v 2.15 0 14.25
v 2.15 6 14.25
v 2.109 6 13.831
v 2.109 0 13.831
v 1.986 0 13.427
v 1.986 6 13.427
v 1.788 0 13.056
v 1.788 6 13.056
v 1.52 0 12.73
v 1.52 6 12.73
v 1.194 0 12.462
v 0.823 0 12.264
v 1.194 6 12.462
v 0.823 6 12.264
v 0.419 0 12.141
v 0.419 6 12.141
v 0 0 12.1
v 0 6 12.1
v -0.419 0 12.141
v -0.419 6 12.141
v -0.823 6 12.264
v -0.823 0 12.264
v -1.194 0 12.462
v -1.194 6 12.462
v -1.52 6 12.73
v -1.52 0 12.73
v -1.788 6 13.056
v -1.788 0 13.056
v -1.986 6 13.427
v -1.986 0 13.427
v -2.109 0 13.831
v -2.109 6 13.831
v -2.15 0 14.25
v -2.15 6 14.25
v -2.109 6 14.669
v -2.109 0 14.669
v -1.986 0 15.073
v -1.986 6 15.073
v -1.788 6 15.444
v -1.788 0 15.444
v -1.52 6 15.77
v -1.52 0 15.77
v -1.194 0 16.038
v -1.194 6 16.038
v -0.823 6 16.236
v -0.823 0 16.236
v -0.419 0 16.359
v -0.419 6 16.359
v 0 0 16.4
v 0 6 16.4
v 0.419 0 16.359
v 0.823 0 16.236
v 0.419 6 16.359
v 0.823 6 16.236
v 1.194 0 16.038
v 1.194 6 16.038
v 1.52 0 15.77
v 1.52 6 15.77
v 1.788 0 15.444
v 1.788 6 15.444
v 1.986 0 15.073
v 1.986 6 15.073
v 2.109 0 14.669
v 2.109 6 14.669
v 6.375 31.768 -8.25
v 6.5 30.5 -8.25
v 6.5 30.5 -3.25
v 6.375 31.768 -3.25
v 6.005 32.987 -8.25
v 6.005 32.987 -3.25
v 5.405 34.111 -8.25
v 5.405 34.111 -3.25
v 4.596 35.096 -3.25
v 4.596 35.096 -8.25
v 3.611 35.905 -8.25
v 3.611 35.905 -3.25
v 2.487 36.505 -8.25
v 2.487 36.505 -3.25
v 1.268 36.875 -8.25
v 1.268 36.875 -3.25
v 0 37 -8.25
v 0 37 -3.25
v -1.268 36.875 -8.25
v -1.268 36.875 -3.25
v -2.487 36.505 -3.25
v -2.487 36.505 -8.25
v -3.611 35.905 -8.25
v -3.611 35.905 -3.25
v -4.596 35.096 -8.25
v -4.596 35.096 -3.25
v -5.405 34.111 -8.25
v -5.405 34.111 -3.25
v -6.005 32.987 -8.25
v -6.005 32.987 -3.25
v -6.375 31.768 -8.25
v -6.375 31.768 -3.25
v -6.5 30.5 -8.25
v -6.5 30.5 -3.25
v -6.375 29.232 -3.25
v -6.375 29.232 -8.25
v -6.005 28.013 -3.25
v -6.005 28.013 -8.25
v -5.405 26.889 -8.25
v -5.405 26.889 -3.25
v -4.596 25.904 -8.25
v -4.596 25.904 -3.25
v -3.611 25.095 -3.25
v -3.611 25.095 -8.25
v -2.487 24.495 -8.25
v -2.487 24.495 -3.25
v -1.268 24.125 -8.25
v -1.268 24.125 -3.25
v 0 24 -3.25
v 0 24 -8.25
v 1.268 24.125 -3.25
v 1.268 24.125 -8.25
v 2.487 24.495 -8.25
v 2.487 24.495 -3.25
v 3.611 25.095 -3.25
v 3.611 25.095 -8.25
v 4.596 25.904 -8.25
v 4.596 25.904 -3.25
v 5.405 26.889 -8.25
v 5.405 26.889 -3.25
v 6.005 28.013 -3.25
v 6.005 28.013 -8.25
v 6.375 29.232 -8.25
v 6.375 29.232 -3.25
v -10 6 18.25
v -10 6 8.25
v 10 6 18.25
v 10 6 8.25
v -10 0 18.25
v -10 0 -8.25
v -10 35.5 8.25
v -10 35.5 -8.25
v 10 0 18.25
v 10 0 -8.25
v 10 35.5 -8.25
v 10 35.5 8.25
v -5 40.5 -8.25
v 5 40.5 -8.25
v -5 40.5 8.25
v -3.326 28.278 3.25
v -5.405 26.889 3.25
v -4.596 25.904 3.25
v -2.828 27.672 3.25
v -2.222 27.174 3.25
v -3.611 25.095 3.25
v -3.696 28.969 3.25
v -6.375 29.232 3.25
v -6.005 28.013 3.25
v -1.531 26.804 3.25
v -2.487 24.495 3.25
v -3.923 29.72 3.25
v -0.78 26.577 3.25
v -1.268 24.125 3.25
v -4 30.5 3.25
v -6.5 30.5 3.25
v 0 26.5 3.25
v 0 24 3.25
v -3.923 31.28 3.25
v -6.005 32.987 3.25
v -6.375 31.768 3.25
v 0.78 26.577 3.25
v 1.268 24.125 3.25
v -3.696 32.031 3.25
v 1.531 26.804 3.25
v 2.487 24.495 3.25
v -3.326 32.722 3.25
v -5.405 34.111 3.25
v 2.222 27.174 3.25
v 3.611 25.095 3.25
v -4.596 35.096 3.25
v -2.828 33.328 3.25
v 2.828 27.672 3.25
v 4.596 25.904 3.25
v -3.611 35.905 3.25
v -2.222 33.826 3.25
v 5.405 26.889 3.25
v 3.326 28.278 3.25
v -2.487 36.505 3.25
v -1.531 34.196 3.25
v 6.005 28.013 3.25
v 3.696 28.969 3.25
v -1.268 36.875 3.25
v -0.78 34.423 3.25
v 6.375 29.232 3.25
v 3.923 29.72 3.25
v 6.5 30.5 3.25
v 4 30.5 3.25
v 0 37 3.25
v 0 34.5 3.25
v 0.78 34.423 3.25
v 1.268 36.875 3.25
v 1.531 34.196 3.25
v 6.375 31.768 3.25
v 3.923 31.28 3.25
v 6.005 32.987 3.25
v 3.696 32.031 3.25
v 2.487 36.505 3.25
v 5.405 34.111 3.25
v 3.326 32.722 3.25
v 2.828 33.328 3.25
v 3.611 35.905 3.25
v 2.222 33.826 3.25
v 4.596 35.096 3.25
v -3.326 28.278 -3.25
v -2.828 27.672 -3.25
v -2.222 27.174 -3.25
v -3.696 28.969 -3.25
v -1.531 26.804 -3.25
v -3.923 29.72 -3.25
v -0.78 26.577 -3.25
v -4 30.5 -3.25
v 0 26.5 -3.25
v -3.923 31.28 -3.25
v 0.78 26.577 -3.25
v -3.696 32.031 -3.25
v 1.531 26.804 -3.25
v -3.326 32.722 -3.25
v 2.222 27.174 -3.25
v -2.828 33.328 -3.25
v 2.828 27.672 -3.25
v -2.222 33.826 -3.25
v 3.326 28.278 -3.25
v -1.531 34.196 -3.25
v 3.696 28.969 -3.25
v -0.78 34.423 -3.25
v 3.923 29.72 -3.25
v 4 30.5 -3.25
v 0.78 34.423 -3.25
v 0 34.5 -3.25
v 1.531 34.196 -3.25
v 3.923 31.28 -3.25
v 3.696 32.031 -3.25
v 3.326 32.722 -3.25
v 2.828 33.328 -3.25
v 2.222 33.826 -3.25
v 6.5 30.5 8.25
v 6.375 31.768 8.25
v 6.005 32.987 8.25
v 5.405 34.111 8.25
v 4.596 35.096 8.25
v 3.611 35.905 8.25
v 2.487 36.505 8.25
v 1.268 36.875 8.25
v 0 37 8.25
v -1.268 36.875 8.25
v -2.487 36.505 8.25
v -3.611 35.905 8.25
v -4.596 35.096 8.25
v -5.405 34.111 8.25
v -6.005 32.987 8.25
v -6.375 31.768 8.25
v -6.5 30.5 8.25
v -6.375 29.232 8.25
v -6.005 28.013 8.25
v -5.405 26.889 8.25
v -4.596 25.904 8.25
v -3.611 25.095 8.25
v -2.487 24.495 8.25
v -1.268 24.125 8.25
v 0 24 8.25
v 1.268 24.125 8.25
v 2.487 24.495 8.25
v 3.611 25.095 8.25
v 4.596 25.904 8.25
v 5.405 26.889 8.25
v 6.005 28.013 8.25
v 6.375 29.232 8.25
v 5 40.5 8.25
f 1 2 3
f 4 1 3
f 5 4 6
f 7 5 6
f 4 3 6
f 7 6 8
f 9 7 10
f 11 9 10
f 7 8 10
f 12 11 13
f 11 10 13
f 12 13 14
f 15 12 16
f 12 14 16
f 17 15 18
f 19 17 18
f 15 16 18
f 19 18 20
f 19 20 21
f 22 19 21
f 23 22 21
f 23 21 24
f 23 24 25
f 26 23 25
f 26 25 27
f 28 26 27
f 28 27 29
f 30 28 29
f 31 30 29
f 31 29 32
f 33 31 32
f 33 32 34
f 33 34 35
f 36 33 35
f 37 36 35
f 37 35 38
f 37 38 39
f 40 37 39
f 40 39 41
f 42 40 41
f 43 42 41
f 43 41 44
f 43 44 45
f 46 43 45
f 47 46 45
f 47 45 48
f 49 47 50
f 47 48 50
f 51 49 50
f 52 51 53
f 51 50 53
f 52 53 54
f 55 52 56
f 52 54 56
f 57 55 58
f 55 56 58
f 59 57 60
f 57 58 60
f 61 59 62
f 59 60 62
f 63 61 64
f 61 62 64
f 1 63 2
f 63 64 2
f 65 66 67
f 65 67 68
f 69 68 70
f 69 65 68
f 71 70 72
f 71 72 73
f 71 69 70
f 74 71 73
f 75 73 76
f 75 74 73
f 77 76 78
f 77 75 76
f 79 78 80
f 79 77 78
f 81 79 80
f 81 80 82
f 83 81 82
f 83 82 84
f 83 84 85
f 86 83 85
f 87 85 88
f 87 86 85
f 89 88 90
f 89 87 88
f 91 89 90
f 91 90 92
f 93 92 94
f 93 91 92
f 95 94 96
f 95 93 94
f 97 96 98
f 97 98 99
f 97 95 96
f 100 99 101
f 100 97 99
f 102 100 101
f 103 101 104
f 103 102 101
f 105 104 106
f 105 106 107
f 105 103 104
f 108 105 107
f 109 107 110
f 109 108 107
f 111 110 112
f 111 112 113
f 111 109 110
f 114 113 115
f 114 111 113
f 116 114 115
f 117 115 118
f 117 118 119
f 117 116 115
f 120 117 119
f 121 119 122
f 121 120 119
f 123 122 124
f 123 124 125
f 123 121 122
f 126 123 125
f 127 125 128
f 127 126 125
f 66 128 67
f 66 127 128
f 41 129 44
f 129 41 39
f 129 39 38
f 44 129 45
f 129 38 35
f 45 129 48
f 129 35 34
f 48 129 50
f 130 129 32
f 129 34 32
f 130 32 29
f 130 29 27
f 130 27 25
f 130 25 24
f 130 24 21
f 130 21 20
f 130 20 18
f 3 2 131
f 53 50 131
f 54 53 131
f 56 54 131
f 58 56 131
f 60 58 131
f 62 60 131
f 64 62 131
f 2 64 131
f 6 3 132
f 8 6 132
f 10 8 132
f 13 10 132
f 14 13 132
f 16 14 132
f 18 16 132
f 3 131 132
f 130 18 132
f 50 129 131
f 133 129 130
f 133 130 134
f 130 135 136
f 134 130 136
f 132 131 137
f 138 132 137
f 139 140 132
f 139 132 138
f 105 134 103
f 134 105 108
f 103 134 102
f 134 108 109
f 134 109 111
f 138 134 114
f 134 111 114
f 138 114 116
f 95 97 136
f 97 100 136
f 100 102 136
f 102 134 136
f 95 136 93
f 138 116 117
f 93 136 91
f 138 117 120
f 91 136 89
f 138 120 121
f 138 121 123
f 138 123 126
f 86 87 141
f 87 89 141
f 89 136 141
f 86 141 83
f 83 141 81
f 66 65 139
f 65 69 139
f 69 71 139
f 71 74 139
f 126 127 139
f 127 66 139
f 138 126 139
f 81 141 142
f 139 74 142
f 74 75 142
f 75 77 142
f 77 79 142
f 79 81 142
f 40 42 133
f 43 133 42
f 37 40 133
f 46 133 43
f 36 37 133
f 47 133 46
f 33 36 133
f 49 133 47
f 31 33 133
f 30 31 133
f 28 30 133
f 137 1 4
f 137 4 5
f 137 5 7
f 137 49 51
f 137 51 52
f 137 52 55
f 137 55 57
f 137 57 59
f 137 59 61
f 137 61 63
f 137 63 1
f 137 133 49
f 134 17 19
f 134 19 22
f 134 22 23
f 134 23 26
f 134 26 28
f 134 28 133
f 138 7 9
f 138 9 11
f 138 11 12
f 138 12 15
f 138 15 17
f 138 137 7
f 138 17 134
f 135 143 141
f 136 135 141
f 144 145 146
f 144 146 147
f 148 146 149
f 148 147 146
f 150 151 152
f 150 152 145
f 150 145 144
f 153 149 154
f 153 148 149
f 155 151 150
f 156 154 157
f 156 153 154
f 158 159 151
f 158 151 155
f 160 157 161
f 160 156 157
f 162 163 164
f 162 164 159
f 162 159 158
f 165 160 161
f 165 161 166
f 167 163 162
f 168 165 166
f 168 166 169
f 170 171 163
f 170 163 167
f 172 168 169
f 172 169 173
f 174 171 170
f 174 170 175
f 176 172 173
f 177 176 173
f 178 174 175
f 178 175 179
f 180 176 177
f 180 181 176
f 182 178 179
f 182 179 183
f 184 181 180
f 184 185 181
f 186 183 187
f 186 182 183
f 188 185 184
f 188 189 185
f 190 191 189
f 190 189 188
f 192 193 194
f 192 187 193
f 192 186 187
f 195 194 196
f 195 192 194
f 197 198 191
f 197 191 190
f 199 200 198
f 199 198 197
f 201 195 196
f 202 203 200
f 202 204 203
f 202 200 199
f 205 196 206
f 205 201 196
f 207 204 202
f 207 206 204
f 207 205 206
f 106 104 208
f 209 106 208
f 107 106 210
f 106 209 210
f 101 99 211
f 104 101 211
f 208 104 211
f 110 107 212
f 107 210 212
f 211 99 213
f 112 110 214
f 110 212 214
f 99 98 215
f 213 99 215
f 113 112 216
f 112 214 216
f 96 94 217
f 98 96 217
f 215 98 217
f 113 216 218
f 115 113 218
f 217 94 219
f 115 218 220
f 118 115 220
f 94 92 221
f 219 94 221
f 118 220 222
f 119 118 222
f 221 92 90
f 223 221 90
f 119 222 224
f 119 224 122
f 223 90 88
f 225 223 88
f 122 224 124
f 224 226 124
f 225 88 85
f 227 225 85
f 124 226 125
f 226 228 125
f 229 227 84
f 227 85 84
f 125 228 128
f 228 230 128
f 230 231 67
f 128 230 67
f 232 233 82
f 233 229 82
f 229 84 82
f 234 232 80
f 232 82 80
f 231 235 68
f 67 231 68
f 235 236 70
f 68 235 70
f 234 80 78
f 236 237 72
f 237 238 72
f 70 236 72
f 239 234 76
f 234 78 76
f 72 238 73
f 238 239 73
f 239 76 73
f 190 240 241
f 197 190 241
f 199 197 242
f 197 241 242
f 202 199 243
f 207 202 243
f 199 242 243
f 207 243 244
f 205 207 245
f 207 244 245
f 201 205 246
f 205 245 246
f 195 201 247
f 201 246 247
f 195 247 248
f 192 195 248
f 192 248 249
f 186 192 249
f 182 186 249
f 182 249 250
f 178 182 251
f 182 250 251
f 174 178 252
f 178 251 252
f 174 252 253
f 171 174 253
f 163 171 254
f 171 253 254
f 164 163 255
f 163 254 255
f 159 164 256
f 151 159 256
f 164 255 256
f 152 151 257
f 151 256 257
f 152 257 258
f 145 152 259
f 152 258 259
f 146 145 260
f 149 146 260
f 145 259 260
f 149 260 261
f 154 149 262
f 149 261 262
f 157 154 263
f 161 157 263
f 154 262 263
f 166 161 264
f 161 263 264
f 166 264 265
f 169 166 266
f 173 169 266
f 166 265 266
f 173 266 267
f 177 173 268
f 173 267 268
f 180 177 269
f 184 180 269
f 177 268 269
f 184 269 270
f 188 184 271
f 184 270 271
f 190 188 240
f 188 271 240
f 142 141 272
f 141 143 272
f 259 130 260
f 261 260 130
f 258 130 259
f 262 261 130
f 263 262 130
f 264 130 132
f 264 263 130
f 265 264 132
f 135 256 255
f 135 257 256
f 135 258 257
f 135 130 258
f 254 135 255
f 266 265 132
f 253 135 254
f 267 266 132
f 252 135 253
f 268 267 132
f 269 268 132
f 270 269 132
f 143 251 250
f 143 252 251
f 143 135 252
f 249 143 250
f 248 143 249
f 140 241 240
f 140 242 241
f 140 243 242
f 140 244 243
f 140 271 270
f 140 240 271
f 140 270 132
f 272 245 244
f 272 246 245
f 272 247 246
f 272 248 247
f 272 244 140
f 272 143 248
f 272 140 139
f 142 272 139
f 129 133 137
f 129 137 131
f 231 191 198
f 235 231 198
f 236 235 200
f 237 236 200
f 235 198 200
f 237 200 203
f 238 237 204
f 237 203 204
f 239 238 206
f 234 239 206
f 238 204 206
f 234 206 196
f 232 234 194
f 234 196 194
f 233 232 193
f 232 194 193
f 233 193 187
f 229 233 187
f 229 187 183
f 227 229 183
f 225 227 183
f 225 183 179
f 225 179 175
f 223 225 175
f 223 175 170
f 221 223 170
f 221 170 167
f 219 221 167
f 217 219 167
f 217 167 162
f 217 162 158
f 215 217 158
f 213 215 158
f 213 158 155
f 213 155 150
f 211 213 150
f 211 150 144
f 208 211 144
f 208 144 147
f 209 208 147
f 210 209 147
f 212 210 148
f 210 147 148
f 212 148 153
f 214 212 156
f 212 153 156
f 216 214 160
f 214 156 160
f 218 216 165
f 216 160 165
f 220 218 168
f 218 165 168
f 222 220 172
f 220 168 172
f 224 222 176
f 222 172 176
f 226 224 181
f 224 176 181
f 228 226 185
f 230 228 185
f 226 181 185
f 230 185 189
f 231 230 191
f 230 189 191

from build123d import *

# Parameters (mm, degrees)
SKETCH_1_W          = 20
SKETCH_1_H          = 40.5
EXTRUDE_1_DEPTH     = 8.25
SKETCH_2_R          = 4
CUT_EXTRUDE_1_DEPTH = 17.5
SKETCH_3_R          = 6.5
CUT_EXTRUDE_2_DEPTH = 5
CHAMFER_1_SIZE      = 5
SKETCH_4_W          = 10
SKETCH_4_H          = 6
EXTRUDE_2_DEPTH     = 20
SKETCH_5_R          = 2.15
CUT_EXTRUDE_3_DEPTH = 17


with BuildPart() as part:
    # 草图1 → 凸台-拉伸1 (new body, symmetric)
    with BuildSketch(Plane.XY):
        with Locations((0, 20.25)):
            Rectangle(SKETCH_1_W, SKETCH_1_H)
    extrude(amount=EXTRUDE_1_DEPTH, both=True)

    # 草图2 → 切除-拉伸1 (cut, through all)
    with BuildSketch(Plane.XY.offset(8.25)):
        with Locations((0, 30.5)):
            Circle(SKETCH_2_R)
    extrude(amount=-CUT_EXTRUDE_1_DEPTH, mode=Mode.SUBTRACT)

    # 草图3 → 切除-拉伸2 (cut)
    with BuildSketch(Plane.XY.offset(8.25)):
        with Locations((0, 30.5)):
            Circle(SKETCH_3_R)
    cut_extrude_2 = extrude(amount=-CUT_EXTRUDE_2_DEPTH, mode=Mode.SUBTRACT)

    # 镜向1: 切除-拉伸2 across plane
    add(cut_extrude_2.mirror(Plane.XY), mode=Mode.SUBTRACT)

    # 倒角1
    chamfer_1_edges = [part.edges().sort_by_distance(p)[0] for p in [
        (-10, 40.5, 0),
        (10, 40.5, 0),
    ]]
    chamfer(chamfer_1_edges, length=CHAMFER_1_SIZE)

    # 草图4 → 凸台-拉伸2 (add)
    with BuildSketch(Plane(origin=(10, 0, 0), x_dir=(0, 0, -1), z_dir=(1, 0, 0))):
        with Locations((-13.25, 3)):
            Rectangle(SKETCH_4_W, SKETCH_4_H)
    extrude(amount=-EXTRUDE_2_DEPTH)

    # 草图5 → 切除-拉伸3 (cut)
    with BuildSketch(Plane(origin=(0, 6, 0), x_dir=(1, 0, 0), z_dir=(0, 1, 0))):
        with Locations((0, -14.25)):
            Circle(SKETCH_5_R)
    extrude(amount=-CUT_EXTRUDE_3_DEPTH, mode=Mode.SUBTRACT)


solid = part.part
